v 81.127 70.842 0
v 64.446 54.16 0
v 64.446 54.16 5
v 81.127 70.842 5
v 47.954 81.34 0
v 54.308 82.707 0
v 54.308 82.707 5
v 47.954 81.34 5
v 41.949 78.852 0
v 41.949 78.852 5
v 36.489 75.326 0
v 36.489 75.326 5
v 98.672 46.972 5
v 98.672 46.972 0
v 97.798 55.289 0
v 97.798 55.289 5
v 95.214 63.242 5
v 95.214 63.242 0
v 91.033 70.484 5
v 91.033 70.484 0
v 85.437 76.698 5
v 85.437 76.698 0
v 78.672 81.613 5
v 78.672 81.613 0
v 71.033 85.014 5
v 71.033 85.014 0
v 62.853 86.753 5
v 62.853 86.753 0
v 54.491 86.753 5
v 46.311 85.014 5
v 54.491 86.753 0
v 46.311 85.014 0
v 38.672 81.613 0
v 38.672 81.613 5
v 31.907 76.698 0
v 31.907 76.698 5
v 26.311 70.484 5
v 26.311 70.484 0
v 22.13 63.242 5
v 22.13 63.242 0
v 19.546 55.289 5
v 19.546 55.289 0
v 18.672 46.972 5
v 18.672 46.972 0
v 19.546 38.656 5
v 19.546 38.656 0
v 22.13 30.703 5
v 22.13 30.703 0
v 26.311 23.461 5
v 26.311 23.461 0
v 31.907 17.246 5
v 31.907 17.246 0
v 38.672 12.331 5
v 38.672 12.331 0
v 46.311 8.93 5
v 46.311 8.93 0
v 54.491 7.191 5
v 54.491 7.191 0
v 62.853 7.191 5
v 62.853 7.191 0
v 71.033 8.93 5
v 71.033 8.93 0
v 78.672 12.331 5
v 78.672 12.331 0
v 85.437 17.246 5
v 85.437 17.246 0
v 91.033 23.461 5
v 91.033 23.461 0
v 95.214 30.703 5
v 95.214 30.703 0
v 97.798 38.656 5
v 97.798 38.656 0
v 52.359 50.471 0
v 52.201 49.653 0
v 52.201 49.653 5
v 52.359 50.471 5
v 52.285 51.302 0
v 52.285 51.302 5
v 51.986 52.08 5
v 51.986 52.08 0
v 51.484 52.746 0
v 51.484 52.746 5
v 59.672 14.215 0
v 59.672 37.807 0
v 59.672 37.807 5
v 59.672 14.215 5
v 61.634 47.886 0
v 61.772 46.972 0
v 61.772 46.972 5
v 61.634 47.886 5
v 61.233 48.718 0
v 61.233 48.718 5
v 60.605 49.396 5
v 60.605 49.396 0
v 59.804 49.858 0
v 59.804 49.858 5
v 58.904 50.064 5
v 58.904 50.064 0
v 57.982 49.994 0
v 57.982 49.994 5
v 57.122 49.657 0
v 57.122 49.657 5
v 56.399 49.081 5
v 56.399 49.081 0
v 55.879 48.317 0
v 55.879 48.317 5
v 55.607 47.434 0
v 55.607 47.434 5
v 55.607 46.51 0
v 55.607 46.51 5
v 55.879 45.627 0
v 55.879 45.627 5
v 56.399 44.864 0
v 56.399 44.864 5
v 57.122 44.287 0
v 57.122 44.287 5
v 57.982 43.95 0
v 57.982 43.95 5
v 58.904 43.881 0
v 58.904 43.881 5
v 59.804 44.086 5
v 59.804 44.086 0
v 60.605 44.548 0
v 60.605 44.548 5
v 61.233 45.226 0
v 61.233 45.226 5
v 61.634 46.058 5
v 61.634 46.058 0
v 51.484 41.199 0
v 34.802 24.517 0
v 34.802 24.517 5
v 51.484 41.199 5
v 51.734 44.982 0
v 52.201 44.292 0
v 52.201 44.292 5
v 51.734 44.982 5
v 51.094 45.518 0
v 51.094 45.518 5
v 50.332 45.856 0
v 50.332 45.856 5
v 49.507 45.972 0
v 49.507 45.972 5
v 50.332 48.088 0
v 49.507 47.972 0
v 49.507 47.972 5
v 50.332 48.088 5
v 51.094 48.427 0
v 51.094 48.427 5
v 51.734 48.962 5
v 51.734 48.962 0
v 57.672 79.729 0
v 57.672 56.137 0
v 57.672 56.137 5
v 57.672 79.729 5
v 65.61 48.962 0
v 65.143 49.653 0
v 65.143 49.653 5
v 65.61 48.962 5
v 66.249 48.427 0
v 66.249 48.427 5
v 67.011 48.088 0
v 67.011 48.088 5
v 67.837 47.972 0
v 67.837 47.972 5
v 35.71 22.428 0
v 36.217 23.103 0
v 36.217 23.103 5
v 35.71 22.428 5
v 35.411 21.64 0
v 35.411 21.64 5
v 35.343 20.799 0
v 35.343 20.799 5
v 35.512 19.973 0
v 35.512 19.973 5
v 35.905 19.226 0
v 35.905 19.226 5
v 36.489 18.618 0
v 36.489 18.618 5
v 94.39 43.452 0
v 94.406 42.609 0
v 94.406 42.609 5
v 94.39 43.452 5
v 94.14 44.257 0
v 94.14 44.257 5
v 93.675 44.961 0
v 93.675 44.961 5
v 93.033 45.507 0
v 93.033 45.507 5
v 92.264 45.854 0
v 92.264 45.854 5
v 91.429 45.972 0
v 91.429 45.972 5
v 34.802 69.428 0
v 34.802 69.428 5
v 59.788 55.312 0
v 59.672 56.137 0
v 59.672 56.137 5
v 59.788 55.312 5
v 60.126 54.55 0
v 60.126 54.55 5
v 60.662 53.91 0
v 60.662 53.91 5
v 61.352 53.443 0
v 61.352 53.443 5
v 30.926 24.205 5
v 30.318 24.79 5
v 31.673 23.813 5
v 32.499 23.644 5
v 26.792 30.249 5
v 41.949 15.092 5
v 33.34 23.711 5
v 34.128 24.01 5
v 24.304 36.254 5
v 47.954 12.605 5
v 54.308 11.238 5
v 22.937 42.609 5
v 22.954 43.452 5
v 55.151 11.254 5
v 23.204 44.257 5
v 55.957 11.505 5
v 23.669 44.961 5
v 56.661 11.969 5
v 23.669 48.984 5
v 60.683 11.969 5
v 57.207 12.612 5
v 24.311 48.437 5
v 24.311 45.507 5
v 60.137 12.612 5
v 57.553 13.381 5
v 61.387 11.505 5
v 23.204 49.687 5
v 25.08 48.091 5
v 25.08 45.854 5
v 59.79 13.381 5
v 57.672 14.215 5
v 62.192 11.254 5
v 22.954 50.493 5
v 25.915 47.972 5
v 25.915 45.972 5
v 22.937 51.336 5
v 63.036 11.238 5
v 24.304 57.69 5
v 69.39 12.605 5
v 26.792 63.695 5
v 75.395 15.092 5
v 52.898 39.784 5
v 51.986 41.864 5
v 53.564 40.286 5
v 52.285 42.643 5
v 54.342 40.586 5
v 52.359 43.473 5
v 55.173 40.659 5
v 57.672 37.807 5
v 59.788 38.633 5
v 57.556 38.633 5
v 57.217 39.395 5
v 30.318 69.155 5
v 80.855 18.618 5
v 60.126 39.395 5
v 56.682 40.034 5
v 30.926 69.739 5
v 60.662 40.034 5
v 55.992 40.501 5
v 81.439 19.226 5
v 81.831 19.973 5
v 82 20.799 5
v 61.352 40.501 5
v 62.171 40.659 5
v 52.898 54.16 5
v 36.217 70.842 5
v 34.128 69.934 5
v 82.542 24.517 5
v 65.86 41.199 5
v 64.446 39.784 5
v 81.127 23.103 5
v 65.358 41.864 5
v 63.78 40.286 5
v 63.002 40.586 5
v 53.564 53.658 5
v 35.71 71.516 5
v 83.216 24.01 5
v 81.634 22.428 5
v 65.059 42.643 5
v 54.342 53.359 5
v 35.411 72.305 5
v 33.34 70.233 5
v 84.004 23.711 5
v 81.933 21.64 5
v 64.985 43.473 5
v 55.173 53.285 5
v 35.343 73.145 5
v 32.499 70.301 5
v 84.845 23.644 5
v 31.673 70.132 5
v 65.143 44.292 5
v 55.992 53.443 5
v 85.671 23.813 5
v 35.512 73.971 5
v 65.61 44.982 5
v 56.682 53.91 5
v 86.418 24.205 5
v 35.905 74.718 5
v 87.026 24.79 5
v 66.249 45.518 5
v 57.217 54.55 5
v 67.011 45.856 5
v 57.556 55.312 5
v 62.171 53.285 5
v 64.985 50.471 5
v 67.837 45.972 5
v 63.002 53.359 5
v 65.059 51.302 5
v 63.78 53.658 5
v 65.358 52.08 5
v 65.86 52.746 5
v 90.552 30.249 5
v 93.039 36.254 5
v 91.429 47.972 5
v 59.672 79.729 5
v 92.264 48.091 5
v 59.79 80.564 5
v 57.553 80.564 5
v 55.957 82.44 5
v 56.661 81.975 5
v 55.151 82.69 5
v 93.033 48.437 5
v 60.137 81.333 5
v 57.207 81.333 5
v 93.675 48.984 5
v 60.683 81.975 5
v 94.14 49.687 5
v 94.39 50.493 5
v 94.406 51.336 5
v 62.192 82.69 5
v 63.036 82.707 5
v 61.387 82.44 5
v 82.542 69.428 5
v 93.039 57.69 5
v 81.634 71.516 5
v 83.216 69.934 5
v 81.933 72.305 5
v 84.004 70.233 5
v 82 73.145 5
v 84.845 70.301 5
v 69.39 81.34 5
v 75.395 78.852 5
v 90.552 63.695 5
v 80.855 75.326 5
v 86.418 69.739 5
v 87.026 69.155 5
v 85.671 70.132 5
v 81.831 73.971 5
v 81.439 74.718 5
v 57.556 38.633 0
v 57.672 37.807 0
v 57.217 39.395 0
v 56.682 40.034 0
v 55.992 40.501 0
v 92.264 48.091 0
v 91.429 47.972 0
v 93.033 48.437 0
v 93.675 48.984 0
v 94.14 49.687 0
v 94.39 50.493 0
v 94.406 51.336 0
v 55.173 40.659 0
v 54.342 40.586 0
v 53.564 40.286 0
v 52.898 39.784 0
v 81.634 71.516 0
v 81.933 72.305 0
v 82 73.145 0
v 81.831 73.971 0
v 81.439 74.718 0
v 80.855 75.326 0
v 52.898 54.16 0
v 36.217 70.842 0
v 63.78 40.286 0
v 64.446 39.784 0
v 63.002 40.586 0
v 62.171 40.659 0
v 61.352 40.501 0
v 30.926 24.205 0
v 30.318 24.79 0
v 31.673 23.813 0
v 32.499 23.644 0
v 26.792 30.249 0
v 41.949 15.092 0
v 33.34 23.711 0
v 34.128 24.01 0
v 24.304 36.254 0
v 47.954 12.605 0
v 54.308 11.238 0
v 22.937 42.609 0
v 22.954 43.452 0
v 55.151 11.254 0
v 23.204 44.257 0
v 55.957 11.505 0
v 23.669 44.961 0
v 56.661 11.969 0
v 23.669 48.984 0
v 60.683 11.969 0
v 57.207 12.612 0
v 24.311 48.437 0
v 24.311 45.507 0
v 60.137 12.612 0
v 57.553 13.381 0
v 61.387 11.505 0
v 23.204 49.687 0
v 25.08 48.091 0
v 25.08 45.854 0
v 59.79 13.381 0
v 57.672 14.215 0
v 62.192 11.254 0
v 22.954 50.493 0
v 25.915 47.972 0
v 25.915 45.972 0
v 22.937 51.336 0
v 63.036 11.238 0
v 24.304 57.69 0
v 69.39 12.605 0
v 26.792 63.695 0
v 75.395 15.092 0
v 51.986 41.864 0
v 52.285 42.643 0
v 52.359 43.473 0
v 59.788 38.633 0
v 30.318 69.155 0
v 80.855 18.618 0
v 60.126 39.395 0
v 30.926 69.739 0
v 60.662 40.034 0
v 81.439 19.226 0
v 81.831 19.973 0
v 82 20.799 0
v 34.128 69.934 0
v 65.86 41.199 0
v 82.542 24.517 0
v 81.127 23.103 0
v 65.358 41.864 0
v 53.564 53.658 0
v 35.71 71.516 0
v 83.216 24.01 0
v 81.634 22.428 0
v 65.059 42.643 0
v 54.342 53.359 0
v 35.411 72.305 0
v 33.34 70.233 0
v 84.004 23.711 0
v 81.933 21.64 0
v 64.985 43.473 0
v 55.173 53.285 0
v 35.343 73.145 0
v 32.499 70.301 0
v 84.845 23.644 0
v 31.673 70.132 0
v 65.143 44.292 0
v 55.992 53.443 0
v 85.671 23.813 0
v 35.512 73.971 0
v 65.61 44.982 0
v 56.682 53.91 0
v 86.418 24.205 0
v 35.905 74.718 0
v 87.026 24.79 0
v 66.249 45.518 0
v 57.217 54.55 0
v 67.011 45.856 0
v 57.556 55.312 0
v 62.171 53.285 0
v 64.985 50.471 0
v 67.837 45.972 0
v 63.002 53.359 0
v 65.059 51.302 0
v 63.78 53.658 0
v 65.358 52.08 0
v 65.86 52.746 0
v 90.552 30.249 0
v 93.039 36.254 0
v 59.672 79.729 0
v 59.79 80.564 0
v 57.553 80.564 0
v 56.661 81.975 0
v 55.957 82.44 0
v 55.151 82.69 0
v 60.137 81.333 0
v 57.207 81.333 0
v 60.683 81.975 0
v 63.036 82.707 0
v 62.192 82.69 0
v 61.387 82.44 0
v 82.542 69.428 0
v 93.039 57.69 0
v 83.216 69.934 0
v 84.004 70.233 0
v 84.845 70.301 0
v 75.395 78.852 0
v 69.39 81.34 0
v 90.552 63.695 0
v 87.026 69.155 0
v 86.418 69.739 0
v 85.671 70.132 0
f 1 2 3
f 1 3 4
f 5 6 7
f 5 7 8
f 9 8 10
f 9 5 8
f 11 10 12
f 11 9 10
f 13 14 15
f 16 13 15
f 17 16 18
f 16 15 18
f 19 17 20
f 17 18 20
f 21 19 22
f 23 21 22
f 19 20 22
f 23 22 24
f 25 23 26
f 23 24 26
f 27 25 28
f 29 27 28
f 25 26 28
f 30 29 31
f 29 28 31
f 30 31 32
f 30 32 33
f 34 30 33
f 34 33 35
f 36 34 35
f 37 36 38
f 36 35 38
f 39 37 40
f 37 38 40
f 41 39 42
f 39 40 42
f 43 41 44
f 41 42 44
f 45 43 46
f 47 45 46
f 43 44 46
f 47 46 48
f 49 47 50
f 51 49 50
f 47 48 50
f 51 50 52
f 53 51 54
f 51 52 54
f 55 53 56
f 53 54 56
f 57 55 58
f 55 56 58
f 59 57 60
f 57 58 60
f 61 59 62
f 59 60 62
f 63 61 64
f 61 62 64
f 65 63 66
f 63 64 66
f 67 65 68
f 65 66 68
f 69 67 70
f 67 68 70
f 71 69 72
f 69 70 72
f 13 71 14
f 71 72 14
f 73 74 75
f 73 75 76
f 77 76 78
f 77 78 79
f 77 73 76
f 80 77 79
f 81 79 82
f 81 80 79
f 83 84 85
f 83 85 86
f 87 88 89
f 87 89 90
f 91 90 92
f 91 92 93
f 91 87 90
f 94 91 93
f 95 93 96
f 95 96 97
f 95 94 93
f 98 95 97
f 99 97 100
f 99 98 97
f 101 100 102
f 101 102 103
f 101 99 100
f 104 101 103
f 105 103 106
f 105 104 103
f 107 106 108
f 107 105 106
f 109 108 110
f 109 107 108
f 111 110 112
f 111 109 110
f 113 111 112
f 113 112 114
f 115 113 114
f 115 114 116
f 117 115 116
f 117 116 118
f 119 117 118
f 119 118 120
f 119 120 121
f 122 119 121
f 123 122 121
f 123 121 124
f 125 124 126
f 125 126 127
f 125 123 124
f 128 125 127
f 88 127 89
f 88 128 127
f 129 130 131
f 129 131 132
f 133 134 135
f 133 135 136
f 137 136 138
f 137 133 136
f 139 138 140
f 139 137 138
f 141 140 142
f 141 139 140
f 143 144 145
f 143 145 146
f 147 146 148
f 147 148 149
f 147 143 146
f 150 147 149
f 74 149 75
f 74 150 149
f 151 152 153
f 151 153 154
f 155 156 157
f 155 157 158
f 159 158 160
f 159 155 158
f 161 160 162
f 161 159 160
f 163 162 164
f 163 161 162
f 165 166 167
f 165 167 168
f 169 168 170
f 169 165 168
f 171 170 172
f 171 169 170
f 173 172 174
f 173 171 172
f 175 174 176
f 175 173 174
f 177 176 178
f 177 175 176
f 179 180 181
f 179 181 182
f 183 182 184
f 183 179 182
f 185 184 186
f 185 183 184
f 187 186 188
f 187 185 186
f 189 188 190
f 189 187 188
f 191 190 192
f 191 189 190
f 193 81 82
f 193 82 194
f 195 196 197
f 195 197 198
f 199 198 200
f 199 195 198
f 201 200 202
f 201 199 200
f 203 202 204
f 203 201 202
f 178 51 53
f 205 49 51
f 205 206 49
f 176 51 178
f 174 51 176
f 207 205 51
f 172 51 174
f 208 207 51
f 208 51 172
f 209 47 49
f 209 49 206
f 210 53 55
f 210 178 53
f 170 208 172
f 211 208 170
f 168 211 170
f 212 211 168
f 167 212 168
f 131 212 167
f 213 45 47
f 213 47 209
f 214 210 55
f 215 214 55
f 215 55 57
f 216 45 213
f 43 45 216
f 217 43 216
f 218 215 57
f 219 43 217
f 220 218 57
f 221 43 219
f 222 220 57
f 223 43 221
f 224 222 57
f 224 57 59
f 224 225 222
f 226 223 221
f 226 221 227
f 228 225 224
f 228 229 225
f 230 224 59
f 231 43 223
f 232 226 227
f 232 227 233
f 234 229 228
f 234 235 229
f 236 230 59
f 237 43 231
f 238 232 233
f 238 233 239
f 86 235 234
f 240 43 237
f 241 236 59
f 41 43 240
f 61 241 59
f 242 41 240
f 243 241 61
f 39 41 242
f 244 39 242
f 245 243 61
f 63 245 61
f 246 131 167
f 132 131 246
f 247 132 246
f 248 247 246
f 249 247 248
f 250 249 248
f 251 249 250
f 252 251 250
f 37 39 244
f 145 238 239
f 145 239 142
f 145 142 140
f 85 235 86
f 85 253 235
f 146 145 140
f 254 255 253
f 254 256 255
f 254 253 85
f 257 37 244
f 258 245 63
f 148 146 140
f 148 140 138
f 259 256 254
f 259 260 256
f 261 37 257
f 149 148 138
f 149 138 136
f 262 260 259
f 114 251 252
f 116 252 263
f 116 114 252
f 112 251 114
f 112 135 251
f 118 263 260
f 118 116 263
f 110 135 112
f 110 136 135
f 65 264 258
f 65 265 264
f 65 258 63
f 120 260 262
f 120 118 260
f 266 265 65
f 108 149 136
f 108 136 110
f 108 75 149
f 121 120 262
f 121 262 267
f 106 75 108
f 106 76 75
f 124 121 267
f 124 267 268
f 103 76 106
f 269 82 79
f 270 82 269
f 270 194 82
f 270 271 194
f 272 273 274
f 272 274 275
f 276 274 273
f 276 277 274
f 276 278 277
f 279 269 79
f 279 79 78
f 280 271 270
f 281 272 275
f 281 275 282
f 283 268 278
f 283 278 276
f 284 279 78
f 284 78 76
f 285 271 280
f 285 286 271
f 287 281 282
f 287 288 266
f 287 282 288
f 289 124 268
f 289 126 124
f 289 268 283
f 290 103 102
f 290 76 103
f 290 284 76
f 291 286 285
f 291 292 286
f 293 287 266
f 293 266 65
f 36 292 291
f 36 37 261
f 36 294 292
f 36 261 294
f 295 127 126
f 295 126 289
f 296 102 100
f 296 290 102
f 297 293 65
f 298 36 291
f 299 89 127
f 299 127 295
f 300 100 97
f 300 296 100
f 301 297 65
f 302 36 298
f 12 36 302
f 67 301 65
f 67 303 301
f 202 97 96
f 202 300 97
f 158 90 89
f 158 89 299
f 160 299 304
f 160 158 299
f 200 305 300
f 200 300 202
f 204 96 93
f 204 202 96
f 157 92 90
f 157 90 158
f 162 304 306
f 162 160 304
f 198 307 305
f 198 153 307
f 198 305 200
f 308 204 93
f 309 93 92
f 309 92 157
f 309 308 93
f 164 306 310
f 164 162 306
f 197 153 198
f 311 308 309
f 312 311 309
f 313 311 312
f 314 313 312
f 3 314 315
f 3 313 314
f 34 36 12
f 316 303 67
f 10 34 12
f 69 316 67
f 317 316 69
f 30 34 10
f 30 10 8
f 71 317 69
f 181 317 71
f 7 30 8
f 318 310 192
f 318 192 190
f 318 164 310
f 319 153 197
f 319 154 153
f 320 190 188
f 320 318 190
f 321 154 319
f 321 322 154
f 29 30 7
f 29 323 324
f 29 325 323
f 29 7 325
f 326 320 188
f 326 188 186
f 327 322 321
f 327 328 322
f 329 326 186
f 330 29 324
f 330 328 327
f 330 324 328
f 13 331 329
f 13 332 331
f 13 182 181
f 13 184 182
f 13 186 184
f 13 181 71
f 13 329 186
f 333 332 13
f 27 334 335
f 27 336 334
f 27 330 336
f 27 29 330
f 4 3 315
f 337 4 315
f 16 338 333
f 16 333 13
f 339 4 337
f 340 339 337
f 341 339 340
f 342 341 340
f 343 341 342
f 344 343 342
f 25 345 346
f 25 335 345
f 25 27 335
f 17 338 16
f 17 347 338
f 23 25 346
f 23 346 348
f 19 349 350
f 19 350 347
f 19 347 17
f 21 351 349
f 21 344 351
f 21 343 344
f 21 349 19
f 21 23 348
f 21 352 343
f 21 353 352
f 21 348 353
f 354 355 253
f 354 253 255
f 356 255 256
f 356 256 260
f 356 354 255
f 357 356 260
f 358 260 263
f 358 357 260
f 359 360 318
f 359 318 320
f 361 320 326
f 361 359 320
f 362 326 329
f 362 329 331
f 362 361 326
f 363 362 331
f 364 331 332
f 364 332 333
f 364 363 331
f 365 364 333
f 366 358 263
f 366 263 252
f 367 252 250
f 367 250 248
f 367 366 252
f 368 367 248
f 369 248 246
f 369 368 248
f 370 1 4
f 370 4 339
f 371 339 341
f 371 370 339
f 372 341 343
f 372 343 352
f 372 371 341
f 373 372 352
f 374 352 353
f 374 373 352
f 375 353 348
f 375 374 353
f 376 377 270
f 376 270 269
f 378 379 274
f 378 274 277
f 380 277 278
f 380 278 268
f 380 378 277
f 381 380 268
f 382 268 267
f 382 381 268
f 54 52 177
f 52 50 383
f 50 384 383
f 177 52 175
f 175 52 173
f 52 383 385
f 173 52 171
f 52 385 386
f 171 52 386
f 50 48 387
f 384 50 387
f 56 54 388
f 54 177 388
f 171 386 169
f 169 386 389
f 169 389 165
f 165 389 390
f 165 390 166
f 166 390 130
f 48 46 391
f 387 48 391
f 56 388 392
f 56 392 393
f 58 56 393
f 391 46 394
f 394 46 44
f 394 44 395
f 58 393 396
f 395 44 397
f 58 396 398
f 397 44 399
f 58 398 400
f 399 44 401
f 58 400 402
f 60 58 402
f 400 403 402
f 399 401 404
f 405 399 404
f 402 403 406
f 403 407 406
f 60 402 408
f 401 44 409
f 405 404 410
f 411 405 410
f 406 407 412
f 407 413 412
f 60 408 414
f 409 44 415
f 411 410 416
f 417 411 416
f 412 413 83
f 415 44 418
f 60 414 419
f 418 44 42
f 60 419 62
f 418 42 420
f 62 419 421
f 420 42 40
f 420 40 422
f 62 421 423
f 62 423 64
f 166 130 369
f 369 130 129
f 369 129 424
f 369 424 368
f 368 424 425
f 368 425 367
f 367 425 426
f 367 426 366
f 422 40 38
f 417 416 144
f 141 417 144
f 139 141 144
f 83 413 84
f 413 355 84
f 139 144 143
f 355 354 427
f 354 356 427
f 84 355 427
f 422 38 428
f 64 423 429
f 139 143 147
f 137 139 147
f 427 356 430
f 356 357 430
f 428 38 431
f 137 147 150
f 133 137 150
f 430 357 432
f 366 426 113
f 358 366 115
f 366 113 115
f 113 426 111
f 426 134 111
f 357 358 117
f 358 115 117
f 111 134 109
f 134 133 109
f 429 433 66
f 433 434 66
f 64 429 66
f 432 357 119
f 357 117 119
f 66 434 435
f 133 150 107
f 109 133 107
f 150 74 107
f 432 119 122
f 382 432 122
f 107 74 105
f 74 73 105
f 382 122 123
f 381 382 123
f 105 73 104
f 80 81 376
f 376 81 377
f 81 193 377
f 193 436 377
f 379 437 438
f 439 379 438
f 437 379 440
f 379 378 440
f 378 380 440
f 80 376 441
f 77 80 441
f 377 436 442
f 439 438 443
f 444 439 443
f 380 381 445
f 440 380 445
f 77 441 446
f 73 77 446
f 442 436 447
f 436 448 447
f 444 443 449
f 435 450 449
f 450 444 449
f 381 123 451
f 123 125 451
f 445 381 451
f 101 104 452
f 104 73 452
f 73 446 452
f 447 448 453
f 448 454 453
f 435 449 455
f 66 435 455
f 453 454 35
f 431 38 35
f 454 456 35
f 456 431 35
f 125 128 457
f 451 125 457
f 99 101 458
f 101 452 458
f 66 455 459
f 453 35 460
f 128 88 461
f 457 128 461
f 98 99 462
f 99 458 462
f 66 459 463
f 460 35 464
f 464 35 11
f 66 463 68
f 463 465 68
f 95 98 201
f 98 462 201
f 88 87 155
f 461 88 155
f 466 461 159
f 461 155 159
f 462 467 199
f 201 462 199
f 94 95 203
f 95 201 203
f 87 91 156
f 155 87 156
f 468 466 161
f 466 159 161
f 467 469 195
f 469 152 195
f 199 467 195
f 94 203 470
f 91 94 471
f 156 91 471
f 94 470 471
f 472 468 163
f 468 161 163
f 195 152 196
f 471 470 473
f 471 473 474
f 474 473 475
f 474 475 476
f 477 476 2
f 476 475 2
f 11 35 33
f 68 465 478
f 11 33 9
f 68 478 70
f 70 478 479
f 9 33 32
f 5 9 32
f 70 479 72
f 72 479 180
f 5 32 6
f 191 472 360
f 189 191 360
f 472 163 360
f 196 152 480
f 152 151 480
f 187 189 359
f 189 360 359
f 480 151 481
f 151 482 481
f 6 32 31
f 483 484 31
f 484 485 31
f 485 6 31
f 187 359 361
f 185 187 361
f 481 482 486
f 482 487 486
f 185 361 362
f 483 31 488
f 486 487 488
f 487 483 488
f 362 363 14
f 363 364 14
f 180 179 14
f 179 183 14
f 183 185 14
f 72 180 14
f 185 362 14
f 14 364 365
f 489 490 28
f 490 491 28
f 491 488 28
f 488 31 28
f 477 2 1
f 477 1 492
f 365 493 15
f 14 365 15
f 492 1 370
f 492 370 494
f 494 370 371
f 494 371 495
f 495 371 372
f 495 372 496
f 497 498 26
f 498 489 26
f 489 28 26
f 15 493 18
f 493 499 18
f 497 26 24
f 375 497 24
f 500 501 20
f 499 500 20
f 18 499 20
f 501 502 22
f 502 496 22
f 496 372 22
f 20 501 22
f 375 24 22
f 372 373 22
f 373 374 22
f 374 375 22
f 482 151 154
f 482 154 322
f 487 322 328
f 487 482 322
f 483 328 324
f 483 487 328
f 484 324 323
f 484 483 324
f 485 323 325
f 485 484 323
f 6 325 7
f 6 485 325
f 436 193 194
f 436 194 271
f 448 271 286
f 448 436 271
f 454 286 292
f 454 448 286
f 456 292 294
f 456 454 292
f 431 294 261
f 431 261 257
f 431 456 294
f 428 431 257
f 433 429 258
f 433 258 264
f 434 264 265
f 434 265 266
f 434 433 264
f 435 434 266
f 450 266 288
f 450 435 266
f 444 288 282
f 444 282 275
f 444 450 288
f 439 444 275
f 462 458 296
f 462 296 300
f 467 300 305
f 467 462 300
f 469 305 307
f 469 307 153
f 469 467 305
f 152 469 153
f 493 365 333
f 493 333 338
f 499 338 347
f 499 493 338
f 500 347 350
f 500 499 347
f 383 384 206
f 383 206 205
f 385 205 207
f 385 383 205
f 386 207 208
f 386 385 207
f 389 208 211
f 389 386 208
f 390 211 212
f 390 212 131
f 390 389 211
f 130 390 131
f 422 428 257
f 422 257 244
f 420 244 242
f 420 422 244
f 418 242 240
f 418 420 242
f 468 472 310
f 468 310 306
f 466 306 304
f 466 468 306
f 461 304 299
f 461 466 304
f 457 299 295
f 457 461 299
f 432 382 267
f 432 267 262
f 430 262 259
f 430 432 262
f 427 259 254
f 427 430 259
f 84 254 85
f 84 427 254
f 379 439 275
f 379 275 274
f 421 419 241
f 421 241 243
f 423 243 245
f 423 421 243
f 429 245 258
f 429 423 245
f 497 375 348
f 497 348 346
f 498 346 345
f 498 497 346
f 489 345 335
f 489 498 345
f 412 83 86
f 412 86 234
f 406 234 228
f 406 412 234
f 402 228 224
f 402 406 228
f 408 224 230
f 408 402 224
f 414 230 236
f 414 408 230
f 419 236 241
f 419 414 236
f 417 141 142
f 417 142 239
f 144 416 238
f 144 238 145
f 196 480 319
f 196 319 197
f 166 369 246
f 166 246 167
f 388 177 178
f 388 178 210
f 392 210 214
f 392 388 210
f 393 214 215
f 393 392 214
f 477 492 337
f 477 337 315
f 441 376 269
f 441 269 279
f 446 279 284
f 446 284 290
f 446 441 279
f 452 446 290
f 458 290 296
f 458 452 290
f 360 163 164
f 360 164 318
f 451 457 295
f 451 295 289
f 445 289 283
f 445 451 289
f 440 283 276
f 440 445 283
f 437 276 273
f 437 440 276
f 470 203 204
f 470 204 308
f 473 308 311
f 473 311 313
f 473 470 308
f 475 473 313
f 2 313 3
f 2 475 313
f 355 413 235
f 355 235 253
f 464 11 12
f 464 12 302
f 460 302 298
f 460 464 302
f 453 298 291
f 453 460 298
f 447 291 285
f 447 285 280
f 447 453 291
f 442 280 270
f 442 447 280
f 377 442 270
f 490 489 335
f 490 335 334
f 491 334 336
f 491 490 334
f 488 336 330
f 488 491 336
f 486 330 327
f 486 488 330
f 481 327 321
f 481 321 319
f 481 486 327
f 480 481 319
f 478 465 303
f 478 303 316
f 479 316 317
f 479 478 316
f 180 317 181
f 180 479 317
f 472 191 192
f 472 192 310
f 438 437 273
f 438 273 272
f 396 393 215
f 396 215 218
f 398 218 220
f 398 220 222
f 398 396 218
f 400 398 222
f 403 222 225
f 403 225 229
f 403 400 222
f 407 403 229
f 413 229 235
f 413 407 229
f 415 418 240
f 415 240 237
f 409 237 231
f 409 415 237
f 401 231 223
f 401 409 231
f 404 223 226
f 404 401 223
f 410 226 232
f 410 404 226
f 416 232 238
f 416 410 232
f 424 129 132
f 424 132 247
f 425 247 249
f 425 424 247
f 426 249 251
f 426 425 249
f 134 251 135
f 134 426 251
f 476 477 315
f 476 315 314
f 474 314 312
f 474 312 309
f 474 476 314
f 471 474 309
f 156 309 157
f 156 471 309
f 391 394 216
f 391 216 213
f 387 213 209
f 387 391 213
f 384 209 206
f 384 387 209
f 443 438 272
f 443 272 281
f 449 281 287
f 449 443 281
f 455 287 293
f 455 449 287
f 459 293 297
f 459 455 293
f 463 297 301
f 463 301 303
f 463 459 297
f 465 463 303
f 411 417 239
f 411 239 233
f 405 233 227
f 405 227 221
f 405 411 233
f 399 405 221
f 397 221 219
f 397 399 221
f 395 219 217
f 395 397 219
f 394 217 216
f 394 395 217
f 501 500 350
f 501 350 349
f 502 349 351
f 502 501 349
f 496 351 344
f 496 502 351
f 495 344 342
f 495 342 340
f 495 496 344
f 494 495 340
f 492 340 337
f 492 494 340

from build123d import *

# Parameters (mm, degrees)
MODEL_R         = 40
MODEL_R_2       = 3.1
EXTRUDE_1_DEPTH = 5


with BuildPart() as part:
    # Model → 凸台-拉伸1 (new body)
    with BuildSketch(Plane.XY):
        with Locations((58.671935635, 46.97216953)):
            Circle(MODEL_R)
        with Locations((58.671935635, 46.97216953)):
            Circle(MODEL_R_2, mode=Mode.SUBTRACT)
        with BuildLine():
            Line((57.671935635, 56.13732092), (57.671935635, 79.728848239))
            ThreePointArc((57.671935635, 79.728848239), (56.66053953, 81.975057166), (54.308299271, 82.706728121))
            ThreePointArc((54.308299271, 82.706728121), (44.895332069, 80.231832701), (36.489343796, 75.325875096))
            ThreePointArc((36.489343796, 75.325875096), (35.343428251, 73.145220564), (36.216572772, 70.841745955))
            Line((36.216572772, 70.841745955), (52.898301717, 54.16001701))
            ThreePointArc((52.898301717, 54.16001701), (54.342318321, 53.358794002), (55.991568665, 53.443147825))
            ThreePointArc((55.991568665, 53.443147825), (57.217411925, 54.549696766), (57.671935635, 56.13732092))
        make_face(mode=Mode.SUBTRACT)
        with BuildLine():
            Line((64.445569552, 54.16001701), (81.127298497, 70.841745955))
            ThreePointArc((81.127298497, 70.841745955), (82.000443018, 73.145220564), (80.854527474, 75.325875096))
            ThreePointArc((80.854527474, 75.325875096), (72.4485392, 80.231832701), (63.035571998, 82.706728121))
            ThreePointArc((63.035571998, 82.706728121), (60.683331739, 81.975057166), (59.671935635, 79.728848239))
            Line((59.671935635, 79.728848239), (59.671935635, 56.13732092))
            ThreePointArc((59.671935635, 56.13732092), (60.126459344, 54.549696766), (61.352302605, 53.443147825))
            ThreePointArc((61.352302605, 53.443147825), (63.001552948, 53.358794002), (64.445569552, 54.16001701))
        make_face(mode=Mode.SUBTRACT)
        with BuildLine():
            Line((67.837087024, 47.97216953), (91.428614343, 47.97216953))
            ThreePointArc((91.428614343, 47.97216953), (93.67482327, 48.983565635), (94.406494225, 51.335805894))
            ThreePointArc((94.406494225, 51.335805894), (91.931598805, 60.748773096), (87.0256412, 69.154761369))
            ThreePointArc((87.0256412, 69.154761369), (84.844986668, 70.300676914), (82.54151206, 69.427532393))
            Line((82.54151206, 69.427532393), (65.859783114, 52.745803448))
            ThreePointArc((65.859783114, 52.745803448), (65.058560106, 51.301786844), (65.142913929, 49.652536502))
            ThreePointArc((65.142913929, 49.652536502), (66.24946287, 48.42669324), (67.837087024, 47.97216953))
        make_face(mode=Mode.SUBTRACT)
        with BuildLine():
            Line((65.859783114, 41.198535613), (82.54151206, 24.516806668))
            ThreePointArc((82.54151206, 24.516806668), (84.844986668, 23.643662147), (87.0256412, 24.789577691))
            ThreePointArc((87.0256412, 24.789577691), (91.931598805, 33.195565965), (94.406494225, 42.608533167))
            ThreePointArc((94.406494225, 42.608533167), (93.67482327, 44.960773426), (91.428614343, 45.97216953))
            Line((91.428614343, 45.97216953), (67.837087024, 45.97216953))
            ThreePointArc((67.837087024, 45.97216953), (66.24946287, 45.51764582), (65.142913929, 44.291802559))
            ThreePointArc((65.142913929, 44.291802559), (65.058560106, 42.642552216), (65.859783114, 41.198535613))
        make_face(mode=Mode.SUBTRACT)
        with BuildLine():
            Line((59.671935635, 37.807018141), (59.671935635, 14.215490822))
            ThreePointArc((59.671935635, 14.215490822), (60.683331739, 11.969281895), (63.035571998, 11.23761094))
            ThreePointArc((63.035571998, 11.23761094), (72.4485392, 13.71250636), (80.854527474, 18.618463965))
            ThreePointArc((80.854527474, 18.618463965), (82.000443018, 20.799118497), (81.127298497, 23.102593105))
            Line((81.127298497, 23.102593105), (64.445569552, 39.784322051))
            ThreePointArc((64.445569552, 39.784322051), (63.001552948, 40.585545059), (61.352302606, 40.501191236))
            ThreePointArc((61.352302606, 40.501191236), (60.126459344, 39.394642295), (59.671935635, 37.807018141))
        make_face(mode=Mode.SUBTRACT)
        with BuildLine():
            Line((52.898301717, 39.784322051), (36.216572772, 23.102593105))
            ThreePointArc((36.216572772, 23.102593105), (35.343428251, 20.799118497), (36.489343796, 18.618463965))
            ThreePointArc((36.489343796, 18.618463965), (44.895332069, 13.71250636), (54.308299271, 11.23761094))
            ThreePointArc((54.308299271, 11.23761094), (56.66053953, 11.969281895), (57.671935635, 14.215490822))
            Line((57.671935635, 14.215490822), (57.671935635, 37.807018141))
            ThreePointArc((57.671935635, 37.807018141), (57.217411925, 39.394642295), (55.991568664, 40.501191236))
            ThreePointArc((55.991568664, 40.501191236), (54.342318321, 40.585545059), (52.898301717, 39.784322051))
        make_face(mode=Mode.SUBTRACT)
        with BuildLine():
            Line((49.506784245, 45.97216953), (25.915256926, 45.97216953))
            ThreePointArc((25.915256926, 45.97216953), (23.669047999, 44.960773426), (22.937377044, 42.608533167))
            ThreePointArc((22.937377044, 42.608533167), (25.412272464, 33.195565965), (30.318230069, 24.789577691))
            ThreePointArc((30.318230069, 24.789577691), (32.498884601, 23.643662147), (34.80235921, 24.516806668))
            Line((34.80235921, 24.516806668), (51.484088155, 41.198535613))
            ThreePointArc((51.484088155, 41.198535613), (52.285311163, 42.642552216), (52.20095734, 44.291802559))
            ThreePointArc((52.20095734, 44.291802559), (51.0944084, 45.51764582), (49.506784245, 45.97216953))
        make_face(mode=Mode.SUBTRACT)
        with BuildLine():
            Line((51.484088155, 52.745803448), (34.80235921, 69.427532393))
            ThreePointArc((34.80235921, 69.427532393), (32.498884601, 70.300676914), (30.318230069, 69.154761369))
            ThreePointArc((30.318230069, 69.154761369), (25.412272464, 60.748773096), (22.937377044, 51.335805894))
            ThreePointArc((22.937377044, 51.335805894), (23.669047999, 48.983565635), (25.915256926, 47.97216953))
            Line((25.915256926, 47.97216953), (49.506784245, 47.97216953))
            ThreePointArc((49.506784245, 47.97216953), (51.094408399, 48.42669324), (52.20095734, 49.652536501))
            ThreePointArc((52.20095734, 49.652536501), (52.285311163, 51.301786844), (51.484088155, 52.745803448))
        make_face(mode=Mode.SUBTRACT)
    extrude(amount=EXTRUDE_1_DEPTH)


solid = part.part
